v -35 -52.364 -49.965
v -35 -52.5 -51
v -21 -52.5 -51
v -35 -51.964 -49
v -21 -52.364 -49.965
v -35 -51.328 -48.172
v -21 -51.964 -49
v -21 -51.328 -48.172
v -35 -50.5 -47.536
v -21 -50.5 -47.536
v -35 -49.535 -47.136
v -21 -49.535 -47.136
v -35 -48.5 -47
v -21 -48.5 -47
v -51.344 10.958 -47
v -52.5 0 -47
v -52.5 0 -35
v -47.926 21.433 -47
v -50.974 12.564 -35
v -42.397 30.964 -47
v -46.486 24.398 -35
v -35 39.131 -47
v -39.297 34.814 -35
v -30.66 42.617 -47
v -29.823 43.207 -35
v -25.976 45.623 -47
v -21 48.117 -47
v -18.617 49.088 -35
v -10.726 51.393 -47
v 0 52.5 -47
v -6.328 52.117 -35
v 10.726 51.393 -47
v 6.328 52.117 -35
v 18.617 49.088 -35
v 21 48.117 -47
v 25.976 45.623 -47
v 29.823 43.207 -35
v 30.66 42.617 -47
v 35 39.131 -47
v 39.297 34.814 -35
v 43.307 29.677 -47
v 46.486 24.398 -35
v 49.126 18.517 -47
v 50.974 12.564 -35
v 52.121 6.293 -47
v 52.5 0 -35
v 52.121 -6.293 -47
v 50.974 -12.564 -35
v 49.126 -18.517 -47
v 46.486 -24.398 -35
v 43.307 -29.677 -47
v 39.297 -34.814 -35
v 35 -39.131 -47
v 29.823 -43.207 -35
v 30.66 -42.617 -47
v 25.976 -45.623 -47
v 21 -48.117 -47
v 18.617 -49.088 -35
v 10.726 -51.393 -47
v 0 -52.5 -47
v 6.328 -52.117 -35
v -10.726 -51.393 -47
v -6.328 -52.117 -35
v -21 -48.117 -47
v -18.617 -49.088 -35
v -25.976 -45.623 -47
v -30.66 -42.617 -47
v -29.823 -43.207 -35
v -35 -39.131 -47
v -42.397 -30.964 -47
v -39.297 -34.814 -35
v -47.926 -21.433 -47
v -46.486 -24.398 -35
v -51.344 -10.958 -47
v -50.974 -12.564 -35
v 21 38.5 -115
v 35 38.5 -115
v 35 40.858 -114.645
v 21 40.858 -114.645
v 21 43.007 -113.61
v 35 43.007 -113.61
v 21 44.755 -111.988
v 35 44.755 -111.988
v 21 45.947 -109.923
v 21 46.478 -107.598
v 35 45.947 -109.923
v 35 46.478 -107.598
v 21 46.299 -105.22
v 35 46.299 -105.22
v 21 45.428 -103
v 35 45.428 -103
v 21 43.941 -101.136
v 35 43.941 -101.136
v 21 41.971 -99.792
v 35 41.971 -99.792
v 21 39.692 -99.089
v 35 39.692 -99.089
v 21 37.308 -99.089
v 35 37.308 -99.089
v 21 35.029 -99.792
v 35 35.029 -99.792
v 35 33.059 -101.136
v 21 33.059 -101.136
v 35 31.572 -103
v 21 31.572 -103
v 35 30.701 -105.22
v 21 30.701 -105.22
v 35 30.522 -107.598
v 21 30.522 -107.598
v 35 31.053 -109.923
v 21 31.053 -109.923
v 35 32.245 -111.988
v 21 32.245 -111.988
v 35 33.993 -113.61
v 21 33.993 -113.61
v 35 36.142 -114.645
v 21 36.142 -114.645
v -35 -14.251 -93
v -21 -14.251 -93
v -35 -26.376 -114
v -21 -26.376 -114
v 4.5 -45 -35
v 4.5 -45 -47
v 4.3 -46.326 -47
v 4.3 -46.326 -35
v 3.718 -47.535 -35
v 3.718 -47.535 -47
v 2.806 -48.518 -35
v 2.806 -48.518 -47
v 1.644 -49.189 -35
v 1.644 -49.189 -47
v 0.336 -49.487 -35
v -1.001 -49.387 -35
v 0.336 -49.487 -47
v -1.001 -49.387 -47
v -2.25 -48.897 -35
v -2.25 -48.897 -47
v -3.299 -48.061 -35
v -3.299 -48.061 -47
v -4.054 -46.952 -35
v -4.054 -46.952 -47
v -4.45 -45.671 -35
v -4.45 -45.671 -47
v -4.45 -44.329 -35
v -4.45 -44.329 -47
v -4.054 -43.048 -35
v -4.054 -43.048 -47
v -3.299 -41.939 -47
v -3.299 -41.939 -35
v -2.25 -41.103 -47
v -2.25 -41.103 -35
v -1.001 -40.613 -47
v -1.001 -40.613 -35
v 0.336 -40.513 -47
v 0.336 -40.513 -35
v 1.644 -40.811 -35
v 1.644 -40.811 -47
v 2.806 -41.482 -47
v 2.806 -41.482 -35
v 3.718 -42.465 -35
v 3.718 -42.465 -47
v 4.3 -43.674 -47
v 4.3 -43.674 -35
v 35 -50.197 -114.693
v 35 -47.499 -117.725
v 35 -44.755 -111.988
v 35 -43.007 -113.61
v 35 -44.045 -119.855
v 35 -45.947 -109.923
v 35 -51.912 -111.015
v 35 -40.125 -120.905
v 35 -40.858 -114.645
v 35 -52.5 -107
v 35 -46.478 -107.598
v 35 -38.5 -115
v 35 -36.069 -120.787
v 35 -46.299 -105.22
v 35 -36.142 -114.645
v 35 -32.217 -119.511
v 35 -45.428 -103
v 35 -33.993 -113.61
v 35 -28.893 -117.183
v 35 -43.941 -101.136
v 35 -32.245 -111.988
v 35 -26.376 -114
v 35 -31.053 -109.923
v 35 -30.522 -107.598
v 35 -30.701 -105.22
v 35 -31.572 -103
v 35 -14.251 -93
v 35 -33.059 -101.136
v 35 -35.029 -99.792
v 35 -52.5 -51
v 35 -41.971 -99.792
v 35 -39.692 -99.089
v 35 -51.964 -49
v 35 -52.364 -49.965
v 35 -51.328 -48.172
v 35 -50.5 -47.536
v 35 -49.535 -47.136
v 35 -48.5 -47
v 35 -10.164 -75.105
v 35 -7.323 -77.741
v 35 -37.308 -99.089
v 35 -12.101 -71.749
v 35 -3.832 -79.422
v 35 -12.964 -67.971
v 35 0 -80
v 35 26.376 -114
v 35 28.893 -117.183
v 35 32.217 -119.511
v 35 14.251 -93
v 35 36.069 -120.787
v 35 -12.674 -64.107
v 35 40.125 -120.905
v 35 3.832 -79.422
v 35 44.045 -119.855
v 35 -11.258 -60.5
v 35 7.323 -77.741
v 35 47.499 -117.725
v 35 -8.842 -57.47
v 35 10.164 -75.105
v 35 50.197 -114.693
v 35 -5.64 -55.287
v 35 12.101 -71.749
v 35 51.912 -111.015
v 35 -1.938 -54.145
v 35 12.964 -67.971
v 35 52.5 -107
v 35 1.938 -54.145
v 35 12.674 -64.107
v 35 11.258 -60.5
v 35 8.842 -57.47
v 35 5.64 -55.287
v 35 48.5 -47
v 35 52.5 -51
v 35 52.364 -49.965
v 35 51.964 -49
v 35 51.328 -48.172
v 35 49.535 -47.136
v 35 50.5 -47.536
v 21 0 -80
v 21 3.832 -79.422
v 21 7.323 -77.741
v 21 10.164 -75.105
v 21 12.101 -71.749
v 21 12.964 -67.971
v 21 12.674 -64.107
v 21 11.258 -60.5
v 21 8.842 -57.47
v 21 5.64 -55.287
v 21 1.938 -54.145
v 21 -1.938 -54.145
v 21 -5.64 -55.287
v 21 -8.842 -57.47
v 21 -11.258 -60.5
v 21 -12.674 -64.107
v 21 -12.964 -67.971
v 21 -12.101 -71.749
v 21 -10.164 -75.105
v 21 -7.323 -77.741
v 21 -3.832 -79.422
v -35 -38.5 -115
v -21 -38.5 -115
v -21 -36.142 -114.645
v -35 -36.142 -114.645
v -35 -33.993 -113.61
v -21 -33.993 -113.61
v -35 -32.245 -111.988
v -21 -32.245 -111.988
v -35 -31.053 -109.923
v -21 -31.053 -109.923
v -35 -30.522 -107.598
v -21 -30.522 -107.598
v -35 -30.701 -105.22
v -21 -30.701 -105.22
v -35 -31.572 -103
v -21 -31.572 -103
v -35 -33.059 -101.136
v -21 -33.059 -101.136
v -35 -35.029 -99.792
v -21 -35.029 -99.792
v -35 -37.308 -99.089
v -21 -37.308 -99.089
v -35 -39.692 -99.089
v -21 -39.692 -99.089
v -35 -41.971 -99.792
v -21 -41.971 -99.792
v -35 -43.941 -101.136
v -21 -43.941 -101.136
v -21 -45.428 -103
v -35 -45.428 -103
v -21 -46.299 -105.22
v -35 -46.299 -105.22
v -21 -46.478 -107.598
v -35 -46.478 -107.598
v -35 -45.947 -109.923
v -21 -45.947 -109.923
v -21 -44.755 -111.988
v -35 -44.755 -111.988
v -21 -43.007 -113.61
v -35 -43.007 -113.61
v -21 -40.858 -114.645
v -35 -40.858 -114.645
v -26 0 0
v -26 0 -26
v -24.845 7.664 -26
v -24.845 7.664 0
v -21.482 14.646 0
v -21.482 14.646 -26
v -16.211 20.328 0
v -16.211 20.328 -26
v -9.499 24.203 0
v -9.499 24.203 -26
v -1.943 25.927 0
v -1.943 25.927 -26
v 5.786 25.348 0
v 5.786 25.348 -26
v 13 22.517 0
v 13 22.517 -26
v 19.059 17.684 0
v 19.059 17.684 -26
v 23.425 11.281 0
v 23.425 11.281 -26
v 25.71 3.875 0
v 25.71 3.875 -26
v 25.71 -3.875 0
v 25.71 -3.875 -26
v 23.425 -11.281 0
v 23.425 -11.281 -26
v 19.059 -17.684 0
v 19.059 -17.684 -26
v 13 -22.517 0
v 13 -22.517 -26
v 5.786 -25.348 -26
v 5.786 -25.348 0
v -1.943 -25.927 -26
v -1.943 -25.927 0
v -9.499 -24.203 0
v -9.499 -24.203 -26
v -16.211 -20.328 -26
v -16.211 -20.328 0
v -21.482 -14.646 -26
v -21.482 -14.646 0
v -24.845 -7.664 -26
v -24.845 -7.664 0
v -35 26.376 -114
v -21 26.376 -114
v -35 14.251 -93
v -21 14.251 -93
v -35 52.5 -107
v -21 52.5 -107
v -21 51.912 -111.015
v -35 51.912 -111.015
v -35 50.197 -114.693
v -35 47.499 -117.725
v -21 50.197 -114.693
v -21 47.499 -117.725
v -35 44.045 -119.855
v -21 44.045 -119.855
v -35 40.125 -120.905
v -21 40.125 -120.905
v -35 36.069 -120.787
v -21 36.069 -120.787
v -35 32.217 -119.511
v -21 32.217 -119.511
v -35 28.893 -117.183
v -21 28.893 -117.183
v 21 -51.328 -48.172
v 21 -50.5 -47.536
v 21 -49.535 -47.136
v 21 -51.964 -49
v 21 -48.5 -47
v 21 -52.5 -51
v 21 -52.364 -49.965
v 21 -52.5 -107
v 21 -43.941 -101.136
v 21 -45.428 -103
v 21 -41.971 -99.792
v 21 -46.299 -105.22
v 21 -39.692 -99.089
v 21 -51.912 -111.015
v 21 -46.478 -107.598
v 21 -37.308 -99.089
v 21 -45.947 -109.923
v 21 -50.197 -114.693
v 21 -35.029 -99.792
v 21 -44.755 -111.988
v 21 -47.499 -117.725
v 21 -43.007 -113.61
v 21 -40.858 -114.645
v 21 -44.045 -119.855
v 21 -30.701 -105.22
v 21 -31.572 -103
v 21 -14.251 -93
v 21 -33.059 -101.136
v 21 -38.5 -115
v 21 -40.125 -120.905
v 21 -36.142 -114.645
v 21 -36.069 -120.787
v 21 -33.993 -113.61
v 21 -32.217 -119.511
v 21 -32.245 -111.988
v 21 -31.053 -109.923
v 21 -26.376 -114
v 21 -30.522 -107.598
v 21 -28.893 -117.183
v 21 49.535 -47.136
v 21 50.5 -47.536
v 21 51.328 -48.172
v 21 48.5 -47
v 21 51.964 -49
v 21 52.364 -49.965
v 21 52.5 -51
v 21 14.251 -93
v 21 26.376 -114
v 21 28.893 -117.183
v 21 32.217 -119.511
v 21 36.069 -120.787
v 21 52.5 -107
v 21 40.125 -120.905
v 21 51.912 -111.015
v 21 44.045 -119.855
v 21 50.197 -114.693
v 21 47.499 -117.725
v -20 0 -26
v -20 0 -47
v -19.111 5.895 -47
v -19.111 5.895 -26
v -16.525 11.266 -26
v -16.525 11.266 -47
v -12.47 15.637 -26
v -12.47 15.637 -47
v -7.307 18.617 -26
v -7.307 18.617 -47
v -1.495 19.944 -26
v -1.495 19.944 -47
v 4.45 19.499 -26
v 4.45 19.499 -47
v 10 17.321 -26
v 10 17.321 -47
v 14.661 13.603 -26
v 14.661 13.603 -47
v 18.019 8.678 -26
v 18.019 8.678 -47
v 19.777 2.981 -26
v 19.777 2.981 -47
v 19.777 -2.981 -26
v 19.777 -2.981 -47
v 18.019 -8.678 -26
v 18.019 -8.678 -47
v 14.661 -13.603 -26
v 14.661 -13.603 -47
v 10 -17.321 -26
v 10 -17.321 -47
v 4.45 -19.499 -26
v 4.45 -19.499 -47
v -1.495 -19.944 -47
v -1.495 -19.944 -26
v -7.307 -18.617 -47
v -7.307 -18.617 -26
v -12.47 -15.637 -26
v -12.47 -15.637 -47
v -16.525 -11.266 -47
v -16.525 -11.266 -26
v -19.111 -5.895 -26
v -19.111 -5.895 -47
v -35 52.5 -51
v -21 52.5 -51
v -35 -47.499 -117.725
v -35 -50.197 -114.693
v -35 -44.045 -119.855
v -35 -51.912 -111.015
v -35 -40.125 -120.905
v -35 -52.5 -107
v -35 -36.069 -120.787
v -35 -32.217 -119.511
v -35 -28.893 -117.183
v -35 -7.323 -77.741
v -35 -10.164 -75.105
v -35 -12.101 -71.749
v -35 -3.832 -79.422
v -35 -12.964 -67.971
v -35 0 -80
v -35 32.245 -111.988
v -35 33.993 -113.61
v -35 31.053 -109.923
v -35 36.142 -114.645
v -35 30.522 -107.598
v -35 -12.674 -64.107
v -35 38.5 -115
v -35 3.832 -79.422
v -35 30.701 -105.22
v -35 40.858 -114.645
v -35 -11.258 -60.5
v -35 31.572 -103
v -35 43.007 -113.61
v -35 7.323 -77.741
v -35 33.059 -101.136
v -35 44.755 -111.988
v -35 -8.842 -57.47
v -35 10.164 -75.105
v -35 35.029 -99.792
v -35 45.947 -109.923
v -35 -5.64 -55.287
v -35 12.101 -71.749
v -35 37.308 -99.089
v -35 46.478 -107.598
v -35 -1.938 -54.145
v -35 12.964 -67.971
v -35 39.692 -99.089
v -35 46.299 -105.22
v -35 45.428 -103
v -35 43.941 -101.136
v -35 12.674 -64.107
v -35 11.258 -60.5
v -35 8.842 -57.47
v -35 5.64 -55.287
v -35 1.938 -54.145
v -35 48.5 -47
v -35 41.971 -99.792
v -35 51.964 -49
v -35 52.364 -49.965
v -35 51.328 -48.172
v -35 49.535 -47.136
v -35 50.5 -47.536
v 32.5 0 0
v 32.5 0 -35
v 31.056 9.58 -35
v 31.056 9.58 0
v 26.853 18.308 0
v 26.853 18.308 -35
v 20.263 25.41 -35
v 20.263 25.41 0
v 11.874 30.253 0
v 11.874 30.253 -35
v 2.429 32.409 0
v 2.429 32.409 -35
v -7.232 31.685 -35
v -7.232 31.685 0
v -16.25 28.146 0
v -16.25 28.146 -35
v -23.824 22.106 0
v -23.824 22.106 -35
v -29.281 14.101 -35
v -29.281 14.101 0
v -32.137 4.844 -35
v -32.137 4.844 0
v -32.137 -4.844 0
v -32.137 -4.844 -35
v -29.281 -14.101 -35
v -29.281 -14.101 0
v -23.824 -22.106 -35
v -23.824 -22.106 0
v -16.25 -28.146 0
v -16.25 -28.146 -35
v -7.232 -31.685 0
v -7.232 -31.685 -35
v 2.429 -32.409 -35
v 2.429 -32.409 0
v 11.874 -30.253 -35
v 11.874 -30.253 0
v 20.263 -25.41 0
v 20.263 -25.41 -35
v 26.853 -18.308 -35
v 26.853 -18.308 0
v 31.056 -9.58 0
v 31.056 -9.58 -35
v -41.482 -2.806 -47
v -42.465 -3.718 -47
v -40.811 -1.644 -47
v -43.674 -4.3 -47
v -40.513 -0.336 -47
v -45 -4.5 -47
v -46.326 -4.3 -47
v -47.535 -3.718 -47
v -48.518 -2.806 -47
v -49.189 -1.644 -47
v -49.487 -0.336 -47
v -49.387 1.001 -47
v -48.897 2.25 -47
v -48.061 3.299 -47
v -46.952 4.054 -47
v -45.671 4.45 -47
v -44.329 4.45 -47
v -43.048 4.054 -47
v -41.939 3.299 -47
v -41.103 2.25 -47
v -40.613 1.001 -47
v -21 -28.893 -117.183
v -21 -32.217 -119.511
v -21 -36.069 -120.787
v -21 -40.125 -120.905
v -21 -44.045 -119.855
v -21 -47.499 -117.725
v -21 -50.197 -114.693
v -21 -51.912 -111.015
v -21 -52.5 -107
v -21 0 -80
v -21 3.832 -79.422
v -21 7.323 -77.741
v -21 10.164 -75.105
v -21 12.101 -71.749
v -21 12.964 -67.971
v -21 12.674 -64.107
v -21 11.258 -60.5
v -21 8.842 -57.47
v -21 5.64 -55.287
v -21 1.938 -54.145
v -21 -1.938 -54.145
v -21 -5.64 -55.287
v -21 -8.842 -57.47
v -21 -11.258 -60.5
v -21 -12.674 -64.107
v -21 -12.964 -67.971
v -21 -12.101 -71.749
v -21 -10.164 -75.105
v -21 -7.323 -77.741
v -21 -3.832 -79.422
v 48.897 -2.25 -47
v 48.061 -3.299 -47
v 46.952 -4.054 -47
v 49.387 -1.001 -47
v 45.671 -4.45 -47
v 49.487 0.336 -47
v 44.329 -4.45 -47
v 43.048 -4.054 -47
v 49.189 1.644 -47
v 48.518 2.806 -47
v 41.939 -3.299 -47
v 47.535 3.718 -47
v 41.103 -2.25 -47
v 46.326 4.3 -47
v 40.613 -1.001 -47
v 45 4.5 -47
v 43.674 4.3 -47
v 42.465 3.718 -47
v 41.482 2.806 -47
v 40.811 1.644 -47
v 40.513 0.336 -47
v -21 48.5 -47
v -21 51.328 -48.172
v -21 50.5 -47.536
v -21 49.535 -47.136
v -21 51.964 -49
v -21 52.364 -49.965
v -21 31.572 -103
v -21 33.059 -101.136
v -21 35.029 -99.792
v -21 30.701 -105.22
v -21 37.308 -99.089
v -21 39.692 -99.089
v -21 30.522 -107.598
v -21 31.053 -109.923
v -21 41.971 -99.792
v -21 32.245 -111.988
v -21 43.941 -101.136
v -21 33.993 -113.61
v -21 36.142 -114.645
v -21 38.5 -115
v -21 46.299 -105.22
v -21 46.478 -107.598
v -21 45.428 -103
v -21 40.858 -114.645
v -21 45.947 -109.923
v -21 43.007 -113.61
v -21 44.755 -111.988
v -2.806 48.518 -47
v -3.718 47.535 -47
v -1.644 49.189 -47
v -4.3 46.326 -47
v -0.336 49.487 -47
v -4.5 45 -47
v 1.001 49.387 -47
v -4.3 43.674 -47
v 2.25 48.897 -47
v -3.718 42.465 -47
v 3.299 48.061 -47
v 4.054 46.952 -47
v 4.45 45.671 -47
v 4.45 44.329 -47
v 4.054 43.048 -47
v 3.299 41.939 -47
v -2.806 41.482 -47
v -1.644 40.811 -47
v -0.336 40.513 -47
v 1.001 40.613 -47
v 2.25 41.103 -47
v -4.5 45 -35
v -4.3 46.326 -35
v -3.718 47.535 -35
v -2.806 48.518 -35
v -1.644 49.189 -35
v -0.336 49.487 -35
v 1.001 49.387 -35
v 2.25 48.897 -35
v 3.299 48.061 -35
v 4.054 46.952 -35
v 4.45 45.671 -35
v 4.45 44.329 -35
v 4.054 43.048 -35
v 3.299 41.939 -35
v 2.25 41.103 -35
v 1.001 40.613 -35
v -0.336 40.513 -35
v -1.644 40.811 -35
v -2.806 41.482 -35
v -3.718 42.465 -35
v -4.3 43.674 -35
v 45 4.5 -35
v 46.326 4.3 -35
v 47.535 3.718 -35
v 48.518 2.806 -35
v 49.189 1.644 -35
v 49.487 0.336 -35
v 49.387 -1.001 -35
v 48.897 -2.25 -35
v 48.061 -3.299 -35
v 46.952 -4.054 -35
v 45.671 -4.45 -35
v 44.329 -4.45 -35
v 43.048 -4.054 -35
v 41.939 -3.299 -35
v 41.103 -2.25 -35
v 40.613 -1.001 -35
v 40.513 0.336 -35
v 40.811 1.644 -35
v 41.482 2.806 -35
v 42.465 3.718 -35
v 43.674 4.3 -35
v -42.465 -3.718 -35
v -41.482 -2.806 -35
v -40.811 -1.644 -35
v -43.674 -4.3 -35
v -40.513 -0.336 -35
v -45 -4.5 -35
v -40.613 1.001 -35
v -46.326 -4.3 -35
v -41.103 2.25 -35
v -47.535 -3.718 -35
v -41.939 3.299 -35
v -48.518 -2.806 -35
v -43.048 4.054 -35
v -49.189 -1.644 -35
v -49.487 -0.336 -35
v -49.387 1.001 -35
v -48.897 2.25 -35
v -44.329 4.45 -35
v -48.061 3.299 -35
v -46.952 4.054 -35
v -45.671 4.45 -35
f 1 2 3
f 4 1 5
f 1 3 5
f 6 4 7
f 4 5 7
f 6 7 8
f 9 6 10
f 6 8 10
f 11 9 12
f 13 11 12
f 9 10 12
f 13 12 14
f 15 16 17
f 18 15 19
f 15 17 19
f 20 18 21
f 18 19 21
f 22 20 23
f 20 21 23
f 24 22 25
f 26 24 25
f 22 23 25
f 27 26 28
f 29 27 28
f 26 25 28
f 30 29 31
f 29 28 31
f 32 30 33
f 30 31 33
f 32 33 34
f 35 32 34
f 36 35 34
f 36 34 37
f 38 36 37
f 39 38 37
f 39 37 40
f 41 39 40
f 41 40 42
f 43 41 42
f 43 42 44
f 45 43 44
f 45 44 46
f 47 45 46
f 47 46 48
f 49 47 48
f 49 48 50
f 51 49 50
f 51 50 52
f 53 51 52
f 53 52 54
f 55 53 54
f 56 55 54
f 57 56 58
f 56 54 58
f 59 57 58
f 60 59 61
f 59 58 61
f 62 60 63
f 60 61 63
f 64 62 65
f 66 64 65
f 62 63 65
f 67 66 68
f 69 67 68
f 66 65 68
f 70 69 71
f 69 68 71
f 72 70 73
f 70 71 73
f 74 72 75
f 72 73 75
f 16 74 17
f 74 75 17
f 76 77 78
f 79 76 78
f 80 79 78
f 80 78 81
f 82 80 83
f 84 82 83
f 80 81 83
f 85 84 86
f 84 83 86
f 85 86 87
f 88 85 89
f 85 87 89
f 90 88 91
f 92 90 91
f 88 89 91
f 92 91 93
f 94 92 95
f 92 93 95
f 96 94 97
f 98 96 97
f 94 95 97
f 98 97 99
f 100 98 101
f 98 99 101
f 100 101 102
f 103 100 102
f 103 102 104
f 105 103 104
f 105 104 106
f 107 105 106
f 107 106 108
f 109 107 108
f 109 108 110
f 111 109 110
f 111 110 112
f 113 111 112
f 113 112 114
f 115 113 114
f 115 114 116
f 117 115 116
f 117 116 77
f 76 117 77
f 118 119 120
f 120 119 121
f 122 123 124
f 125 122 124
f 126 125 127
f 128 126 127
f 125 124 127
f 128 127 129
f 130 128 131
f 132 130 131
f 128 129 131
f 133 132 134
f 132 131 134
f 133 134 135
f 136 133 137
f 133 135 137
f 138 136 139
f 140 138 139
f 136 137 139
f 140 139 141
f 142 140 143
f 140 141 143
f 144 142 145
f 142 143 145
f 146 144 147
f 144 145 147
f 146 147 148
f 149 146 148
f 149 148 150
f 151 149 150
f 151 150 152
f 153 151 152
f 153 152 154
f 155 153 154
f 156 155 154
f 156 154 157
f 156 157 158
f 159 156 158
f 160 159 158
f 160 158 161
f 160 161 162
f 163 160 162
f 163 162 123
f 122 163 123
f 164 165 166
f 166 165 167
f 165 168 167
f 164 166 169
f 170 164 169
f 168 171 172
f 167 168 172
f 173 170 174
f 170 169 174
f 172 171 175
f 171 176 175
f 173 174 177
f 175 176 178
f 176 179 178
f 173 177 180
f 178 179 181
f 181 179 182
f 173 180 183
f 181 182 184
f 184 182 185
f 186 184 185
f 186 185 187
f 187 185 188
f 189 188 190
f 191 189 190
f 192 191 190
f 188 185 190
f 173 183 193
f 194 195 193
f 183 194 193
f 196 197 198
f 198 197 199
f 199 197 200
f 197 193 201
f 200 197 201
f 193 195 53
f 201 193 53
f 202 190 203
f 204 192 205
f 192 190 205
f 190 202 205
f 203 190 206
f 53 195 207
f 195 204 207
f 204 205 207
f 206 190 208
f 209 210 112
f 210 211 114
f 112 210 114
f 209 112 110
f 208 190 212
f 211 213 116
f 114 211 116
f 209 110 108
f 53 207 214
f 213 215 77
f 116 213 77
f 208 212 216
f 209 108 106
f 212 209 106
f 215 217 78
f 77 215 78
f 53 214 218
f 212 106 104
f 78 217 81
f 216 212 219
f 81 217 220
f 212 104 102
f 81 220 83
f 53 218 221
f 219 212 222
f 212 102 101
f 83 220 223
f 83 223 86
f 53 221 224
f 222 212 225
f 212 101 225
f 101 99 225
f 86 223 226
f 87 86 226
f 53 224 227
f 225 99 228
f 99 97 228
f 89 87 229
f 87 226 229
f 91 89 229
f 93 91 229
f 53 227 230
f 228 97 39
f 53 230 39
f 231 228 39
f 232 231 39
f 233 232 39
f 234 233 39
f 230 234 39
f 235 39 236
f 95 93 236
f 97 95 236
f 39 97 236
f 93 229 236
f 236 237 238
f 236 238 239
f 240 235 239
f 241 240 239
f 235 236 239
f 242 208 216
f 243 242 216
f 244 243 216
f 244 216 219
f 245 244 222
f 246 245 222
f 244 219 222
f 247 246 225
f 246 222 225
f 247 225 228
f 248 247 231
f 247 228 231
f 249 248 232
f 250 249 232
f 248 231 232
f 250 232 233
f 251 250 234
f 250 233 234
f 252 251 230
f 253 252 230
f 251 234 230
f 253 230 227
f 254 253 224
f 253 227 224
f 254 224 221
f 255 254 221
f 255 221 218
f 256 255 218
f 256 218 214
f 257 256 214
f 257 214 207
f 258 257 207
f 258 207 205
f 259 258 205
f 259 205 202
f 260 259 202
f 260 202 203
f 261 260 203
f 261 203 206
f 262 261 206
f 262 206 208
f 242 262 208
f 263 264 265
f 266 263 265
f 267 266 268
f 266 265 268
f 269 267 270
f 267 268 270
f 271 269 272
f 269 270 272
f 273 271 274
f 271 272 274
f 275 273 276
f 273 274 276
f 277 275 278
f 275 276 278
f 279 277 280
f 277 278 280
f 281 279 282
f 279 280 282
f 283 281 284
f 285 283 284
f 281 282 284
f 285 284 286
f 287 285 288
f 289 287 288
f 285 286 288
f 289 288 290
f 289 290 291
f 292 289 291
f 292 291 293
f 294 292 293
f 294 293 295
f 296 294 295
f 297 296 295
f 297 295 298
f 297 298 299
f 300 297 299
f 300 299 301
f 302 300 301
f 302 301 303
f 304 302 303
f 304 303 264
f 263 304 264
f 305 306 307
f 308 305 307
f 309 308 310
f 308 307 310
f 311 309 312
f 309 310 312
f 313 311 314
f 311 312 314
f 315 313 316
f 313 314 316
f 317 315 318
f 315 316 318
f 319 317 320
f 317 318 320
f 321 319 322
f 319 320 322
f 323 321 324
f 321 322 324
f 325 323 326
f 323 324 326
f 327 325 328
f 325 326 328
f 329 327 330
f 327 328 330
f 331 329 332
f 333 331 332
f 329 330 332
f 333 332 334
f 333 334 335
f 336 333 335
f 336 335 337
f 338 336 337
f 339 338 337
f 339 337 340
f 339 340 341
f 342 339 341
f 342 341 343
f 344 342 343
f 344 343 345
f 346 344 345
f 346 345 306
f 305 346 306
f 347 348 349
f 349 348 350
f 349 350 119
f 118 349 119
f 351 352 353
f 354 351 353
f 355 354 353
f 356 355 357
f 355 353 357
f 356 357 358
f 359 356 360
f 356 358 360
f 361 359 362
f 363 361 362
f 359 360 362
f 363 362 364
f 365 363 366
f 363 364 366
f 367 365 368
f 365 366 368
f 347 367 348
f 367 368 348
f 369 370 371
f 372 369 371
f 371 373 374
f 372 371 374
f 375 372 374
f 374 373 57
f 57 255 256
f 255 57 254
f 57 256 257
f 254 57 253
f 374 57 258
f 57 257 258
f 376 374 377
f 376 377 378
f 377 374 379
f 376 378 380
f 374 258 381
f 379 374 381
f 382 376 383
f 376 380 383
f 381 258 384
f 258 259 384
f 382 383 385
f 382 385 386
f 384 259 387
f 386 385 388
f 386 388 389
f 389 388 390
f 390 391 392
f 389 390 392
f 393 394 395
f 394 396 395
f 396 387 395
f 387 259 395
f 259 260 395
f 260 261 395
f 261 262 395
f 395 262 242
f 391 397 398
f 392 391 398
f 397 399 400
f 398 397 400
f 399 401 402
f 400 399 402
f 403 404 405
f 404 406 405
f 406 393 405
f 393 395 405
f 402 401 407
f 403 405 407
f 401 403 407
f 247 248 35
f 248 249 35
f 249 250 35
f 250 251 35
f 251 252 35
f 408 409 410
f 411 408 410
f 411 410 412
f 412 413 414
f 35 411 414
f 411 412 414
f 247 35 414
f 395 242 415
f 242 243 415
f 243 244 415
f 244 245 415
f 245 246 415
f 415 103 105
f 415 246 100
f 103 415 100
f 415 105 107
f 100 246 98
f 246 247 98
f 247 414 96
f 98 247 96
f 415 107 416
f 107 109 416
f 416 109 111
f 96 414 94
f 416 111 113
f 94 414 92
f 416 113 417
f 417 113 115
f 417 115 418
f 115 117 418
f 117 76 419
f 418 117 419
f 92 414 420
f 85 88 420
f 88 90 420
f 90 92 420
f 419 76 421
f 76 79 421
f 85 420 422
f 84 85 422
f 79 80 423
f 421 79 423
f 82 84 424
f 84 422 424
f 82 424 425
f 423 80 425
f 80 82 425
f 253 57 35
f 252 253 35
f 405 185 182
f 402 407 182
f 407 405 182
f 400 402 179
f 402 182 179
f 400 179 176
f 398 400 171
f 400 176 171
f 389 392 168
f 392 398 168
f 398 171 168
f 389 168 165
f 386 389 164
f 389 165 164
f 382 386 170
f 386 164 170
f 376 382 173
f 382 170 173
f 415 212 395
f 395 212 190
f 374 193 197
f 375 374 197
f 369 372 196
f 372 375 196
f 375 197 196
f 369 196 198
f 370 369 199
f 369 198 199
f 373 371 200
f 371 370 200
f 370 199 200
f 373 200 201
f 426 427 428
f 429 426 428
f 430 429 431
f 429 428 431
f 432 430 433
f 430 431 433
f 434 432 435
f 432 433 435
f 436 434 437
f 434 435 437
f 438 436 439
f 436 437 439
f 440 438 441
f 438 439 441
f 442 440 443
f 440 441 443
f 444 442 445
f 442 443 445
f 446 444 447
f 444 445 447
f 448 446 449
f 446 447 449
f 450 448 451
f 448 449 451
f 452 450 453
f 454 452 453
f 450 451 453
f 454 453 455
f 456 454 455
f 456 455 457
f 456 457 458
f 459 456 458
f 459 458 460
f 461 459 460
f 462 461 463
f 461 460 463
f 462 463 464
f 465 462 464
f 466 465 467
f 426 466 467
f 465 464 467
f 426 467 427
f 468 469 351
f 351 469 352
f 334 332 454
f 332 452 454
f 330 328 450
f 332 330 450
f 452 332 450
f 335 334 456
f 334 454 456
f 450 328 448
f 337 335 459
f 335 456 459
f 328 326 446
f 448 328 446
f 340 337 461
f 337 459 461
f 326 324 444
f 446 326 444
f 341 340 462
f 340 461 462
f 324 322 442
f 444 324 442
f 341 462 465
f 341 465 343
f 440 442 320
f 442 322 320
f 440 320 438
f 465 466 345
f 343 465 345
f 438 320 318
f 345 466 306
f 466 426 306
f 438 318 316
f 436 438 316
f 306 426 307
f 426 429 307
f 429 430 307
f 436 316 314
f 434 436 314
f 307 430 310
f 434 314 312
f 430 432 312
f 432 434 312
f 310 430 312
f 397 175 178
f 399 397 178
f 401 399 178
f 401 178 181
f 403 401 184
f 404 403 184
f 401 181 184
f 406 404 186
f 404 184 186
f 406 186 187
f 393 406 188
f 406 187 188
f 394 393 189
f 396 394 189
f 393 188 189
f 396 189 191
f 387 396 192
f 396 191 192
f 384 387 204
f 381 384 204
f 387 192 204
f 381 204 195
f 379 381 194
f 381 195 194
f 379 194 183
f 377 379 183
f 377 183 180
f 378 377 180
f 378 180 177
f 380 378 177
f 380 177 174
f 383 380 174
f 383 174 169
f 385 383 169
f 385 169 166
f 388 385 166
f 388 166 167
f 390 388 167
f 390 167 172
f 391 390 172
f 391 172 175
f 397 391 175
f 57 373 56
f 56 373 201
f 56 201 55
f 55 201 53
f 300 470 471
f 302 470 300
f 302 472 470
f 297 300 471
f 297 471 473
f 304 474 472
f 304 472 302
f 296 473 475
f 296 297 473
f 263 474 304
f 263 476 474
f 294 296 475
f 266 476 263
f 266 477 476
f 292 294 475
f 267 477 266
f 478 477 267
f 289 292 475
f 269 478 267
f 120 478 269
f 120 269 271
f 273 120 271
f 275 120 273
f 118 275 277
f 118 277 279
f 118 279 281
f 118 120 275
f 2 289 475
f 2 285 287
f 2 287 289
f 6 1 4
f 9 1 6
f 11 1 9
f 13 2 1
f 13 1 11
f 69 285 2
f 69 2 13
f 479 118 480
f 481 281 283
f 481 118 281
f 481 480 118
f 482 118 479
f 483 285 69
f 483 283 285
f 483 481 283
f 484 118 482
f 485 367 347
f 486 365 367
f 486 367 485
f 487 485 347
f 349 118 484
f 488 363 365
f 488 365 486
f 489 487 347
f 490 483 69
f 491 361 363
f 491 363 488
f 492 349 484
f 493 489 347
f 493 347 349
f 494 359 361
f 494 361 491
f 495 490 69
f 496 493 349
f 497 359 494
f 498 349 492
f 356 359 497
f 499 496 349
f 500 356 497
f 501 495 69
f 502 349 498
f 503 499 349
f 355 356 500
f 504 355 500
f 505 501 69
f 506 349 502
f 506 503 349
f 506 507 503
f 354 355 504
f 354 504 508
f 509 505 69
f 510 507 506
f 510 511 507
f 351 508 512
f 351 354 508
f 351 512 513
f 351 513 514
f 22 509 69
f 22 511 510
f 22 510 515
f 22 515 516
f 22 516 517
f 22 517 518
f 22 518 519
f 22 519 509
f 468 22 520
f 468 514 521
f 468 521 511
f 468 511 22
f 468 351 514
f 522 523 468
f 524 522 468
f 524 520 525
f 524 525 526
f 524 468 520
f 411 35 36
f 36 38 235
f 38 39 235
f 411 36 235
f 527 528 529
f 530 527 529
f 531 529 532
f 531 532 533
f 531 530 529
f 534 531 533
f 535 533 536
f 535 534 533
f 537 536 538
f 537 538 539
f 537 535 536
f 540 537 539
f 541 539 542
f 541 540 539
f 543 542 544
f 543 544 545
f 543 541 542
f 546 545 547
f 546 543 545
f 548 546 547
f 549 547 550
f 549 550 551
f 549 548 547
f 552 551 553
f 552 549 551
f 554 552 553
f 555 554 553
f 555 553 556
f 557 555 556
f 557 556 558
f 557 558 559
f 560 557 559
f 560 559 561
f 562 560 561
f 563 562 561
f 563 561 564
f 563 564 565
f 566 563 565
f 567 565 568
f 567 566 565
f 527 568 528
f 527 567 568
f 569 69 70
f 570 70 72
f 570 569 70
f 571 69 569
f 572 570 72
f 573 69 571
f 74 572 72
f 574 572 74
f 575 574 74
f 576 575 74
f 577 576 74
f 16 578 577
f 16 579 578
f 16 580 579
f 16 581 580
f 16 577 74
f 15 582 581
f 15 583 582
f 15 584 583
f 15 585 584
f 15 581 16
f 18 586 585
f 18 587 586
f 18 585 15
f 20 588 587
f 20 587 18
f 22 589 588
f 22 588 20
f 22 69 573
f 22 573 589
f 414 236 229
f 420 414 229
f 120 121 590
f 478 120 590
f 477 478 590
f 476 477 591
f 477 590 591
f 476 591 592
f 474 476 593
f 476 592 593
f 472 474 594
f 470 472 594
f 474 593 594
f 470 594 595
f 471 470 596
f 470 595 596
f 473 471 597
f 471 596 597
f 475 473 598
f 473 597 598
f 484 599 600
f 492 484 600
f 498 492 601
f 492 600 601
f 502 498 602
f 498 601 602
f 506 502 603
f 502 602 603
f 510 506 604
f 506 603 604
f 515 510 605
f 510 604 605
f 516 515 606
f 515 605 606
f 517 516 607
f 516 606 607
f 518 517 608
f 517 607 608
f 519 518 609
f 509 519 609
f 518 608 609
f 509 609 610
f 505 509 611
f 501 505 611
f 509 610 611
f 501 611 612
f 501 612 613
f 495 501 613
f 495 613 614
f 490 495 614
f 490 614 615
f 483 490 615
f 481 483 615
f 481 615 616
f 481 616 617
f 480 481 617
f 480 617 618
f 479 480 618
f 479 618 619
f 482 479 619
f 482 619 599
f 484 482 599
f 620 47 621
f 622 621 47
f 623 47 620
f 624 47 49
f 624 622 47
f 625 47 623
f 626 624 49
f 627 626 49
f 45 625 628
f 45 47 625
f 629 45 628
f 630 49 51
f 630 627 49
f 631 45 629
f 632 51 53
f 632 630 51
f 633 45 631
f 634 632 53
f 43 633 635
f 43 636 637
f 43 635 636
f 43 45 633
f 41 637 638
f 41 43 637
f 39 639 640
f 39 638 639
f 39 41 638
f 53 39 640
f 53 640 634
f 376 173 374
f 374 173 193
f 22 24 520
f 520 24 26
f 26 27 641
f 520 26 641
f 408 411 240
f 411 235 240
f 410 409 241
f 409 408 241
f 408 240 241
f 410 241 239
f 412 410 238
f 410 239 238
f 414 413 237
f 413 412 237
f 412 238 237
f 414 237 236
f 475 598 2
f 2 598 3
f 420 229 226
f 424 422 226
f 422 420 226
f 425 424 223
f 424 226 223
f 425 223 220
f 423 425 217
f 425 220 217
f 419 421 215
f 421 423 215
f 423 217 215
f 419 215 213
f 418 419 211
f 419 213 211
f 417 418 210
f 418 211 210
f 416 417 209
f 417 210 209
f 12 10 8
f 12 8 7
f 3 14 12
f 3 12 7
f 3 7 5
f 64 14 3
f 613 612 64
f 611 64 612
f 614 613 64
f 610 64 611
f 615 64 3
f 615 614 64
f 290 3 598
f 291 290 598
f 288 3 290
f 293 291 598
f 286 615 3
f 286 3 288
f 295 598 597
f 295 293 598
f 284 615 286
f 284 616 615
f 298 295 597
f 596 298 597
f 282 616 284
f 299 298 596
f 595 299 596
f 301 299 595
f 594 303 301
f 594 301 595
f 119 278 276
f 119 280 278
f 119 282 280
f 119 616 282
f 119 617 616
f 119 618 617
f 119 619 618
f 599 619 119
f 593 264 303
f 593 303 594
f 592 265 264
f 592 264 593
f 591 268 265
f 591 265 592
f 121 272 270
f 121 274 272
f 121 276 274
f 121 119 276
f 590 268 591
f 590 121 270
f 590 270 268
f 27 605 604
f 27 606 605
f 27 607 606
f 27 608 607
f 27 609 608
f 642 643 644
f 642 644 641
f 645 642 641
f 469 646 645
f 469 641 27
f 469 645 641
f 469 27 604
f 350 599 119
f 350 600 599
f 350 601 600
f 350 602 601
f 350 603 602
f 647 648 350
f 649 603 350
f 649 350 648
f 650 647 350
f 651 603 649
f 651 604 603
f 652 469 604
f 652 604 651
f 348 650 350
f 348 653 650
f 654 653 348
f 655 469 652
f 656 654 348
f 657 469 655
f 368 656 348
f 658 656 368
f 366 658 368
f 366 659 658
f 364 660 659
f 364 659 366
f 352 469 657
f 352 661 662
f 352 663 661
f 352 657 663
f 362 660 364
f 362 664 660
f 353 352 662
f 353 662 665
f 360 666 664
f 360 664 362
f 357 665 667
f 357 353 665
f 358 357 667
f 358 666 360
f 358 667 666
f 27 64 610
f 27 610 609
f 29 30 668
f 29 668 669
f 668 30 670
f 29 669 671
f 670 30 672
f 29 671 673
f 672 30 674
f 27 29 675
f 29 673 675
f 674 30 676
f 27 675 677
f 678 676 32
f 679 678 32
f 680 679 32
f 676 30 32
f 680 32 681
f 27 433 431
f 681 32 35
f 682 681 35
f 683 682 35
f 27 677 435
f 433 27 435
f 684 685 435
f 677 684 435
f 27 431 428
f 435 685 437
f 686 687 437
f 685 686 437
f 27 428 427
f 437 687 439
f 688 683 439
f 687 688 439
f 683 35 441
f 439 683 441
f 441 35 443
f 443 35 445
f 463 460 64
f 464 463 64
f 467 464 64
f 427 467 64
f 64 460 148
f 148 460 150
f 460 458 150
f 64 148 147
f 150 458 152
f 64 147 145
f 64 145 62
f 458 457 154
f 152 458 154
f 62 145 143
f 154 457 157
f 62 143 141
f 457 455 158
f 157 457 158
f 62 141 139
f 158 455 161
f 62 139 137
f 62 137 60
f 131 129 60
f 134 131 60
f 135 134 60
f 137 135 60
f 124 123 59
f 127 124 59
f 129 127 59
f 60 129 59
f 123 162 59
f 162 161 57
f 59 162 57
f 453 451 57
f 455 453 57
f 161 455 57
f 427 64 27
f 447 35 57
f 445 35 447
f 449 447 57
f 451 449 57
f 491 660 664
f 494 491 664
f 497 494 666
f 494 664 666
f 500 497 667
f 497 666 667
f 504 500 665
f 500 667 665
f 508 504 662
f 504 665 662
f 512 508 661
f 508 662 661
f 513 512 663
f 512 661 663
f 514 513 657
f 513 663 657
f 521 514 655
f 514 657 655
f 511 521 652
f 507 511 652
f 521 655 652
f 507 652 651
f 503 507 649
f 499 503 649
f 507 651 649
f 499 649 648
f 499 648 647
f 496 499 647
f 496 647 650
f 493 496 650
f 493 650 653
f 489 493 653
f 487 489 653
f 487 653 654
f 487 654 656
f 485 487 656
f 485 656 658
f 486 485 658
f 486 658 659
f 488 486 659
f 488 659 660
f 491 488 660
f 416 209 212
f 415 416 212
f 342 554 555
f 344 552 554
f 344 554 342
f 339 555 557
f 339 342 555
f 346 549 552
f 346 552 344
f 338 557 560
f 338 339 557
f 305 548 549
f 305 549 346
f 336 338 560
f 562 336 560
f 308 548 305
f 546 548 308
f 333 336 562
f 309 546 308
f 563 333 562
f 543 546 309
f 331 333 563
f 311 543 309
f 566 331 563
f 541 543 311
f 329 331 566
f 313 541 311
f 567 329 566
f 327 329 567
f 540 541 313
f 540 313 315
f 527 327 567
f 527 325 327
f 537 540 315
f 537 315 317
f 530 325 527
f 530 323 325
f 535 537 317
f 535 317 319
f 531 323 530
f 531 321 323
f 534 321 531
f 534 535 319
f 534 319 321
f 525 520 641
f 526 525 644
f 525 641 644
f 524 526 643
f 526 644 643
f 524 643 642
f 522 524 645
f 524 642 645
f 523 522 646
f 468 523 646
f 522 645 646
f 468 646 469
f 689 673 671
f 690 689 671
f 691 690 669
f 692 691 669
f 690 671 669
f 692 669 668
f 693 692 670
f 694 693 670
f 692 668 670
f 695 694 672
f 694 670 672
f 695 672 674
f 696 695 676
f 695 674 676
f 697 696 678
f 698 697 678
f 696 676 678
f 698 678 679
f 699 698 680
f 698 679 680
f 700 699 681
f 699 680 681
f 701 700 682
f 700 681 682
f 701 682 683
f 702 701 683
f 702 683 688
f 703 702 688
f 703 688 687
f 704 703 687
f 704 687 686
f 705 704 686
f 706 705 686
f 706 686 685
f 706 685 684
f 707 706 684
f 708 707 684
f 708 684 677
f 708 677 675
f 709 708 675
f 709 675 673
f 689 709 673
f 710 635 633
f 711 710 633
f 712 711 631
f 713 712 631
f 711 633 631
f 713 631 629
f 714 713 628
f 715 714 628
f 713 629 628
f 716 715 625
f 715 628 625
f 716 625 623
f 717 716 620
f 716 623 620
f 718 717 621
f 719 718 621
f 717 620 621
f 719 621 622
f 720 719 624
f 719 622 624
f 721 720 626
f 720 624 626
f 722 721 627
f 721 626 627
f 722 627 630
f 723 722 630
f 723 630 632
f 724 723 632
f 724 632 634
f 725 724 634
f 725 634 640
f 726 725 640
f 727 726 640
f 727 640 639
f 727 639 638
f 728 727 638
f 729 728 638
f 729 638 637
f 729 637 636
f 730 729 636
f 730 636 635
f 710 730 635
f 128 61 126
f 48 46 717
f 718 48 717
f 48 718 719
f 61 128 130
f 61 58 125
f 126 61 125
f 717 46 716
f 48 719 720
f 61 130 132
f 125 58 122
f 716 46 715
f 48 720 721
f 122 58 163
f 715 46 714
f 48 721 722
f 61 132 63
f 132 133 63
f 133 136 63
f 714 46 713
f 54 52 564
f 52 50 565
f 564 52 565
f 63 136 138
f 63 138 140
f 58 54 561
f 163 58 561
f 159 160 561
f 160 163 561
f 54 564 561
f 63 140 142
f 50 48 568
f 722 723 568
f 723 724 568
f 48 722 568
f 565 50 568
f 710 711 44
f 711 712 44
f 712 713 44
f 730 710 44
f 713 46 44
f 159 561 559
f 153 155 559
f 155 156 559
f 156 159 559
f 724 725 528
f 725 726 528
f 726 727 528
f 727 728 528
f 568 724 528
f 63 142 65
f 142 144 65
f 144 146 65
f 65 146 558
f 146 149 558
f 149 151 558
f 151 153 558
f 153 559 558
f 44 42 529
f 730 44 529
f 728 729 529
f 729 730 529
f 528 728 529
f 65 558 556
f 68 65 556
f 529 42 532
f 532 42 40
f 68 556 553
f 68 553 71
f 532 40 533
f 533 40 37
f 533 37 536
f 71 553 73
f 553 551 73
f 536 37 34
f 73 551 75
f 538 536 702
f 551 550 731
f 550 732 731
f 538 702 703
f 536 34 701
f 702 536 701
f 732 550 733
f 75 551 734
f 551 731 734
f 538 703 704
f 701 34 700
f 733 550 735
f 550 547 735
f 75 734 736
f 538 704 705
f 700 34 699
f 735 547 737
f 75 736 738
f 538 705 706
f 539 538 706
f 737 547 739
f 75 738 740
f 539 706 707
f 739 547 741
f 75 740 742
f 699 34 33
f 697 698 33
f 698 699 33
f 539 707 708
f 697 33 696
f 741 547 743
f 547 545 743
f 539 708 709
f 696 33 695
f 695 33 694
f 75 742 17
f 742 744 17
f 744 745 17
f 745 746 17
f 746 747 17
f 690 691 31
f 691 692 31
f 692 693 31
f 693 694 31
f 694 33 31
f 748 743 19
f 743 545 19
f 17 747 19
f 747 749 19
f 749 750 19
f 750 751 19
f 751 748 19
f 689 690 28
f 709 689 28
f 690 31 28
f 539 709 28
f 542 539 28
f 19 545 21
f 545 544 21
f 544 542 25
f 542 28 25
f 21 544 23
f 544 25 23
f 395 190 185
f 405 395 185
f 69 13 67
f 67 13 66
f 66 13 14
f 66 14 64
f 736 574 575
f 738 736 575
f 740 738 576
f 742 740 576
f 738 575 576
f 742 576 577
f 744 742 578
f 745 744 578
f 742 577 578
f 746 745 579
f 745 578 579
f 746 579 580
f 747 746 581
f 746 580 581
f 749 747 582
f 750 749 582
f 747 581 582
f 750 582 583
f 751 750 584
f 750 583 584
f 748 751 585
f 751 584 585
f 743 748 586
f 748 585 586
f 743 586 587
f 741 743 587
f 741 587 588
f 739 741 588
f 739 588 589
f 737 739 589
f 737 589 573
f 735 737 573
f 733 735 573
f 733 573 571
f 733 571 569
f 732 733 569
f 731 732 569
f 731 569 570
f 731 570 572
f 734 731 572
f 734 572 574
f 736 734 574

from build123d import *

# Parameters (mm, degrees)
SKETCH_1_R               = 32.5
EXTRUDE_1_DEPTH          = 35
SKETCH_2_R               = 52.5
EXTRUDE_2_DEPTH          = 12
EXTRUDE_3_DEPTH          = 35
CUT_EXTRUDE_2_DEPTH      = 21
SKETCH_7_R               = 8
SKETCH_7_R_2             = 13
CUT_EXTRUDE_3_DEPTH      = 88.5
SKETCH_8_R               = 4.5
CUT_EXTRUDE_4_DEPTH      = 48
PATTERN_CIRCULAR_1_COUNT = 4
SKETCH_9_R               = 20
CUT_EXTRUDE_5_DEPTH      = 21
SKETCH_10_R              = 26
CUT_EXTRUDE_6_DEPTH      = 27


with BuildPart() as part:
    # 草图1 → 凸台-拉伸1 (new body)
    with BuildSketch(Plane.XY):
        Circle(SKETCH_1_R)
    extrude(amount=-EXTRUDE_1_DEPTH)

    # 草图2 → 凸台-拉伸2 (add)
    with BuildSketch(Plane(origin=(0, 0, -35), x_dir=(-1, 0, 0), z_dir=(0, 0, -1))):
        Circle(SKETCH_2_R)
    extrude(amount=EXTRUDE_2_DEPTH)

    # 草图4 → 凸台-拉伸3 (add, symmetric)
    with BuildSketch(Plane(origin=(0, 0, 0), x_dir=(0, 0, -1), z_dir=(1, 0, 0))):
        with BuildLine():
            Line((51, 52.5), (107, 52.5))
            ThreePointArc((107, 52.5), (120.522961568, 42.123466631), (114, 26.375644347))
            Line((114, 26.375644347), (93, 14.251288694))
            Line((93, 14.251288694), (93, -14.251288694))
            Line((93, -14.251288694), (114, -26.375644347))
            ThreePointArc((114, -26.375644347), (120.522961568, -42.123466631), (107, -52.5))
            Line((107, -52.5), (51, -52.5))
            ThreePointArc((51, -52.5), (48.171572875, -51.328427125), (47, -48.5))
            Line((47, -48.5), (47, 48.5))
            ThreePointArc((47, 48.5), (48.171572875, 51.328427125), (51, 52.5))
        make_face()
    extrude(amount=EXTRUDE_3_DEPTH, both=True)

    # 草图6 → 切除-拉伸2 (cut, symmetric)
    with BuildSketch(Plane(origin=(0, 0, 0), x_dir=(0, 0, -1), z_dir=(1, 0, 0))):
        with BuildLine():
            Line((107, 52.5), (51, 52.5))
            ThreePointArc((51, 52.5), (48.171572875, 51.328427125), (47, 48.5))
            Line((47, 48.5), (47, 39.131189606))
            Line((47, 39.131189606), (47, -39.131189606))
            Line((47, -39.131189606), (47, -48.5))
            ThreePointArc((47, -48.5), (48.171572875, -51.328427125), (51, -52.5))
            Line((51, -52.5), (107, -52.5))
            ThreePointArc((107, -52.5), (120.522961568, -42.123466631), (114, -26.375644347))
            Line((114, -26.375644347), (93, -14.251288694))
            Line((93, -14.251288694), (93, 14.251288694))
            Line((93, 14.251288694), (114, 26.375644347))
            ThreePointArc((114, 26.375644347), (120.522961568, 42.123466631), (107, 52.5))
        make_face()
    extrude(amount=CUT_EXTRUDE_2_DEPTH, both=True, mode=Mode.SUBTRACT)

    # 草图7 → 切除-拉伸3 (cut, through all)
    with BuildSketch(Plane(origin=(35, 0, 0), x_dir=(0, 0, -1), z_dir=(1, 0, 0))):
        with Locations((107, 38.5)):
            Circle(SKETCH_7_R)
        with Locations((107, -38.5)):
            Circle(SKETCH_7_R)
        with Locations((67, 0)):
            Circle(SKETCH_7_R_2)
    extrude(amount=-CUT_EXTRUDE_3_DEPTH, mode=Mode.SUBTRACT)

    # 草图8 → 切除-拉伸4 (cut, through all)
    with BuildSketch(Plane(origin=(0, 0, -47), x_dir=(-1, 0, 0), z_dir=(0, 0, -1))):
        with Locations((0, 45)):
            Circle(SKETCH_8_R)
    cut_extrude_4 = extrude(amount=-CUT_EXTRUDE_4_DEPTH, mode=Mode.SUBTRACT)

    # 阵列(圆周)1: 切除-拉伸4 ×4 about axis
    pattern_circular_1_axis = Axis((0, 0, 0), (0, 0, 1))
    for i in range(1, PATTERN_CIRCULAR_1_COUNT):
        add(cut_extrude_4.rotate(pattern_circular_1_axis, i * 360 / PATTERN_CIRCULAR_1_COUNT), mode=Mode.SUBTRACT)

    # 草图9 → 切除-拉伸5 (cut)
    with BuildSketch(Plane(origin=(0, 0, -47), x_dir=(-1, 0, 0), z_dir=(0, 0, -1))):
        Circle(SKETCH_9_R)
    extrude(amount=-CUT_EXTRUDE_5_DEPTH, mode=Mode.SUBTRACT)

    # 草图10 → 切除-拉伸6 (cut, through all)
    with BuildSketch(Plane(origin=(0, 0, -26), x_dir=(-1, 0, 0), z_dir=(0, 0, -1))):
        Circle(SKETCH_10_R)
    extrude(amount=-CUT_EXTRUDE_6_DEPTH, mode=Mode.SUBTRACT)


solid = part.part
